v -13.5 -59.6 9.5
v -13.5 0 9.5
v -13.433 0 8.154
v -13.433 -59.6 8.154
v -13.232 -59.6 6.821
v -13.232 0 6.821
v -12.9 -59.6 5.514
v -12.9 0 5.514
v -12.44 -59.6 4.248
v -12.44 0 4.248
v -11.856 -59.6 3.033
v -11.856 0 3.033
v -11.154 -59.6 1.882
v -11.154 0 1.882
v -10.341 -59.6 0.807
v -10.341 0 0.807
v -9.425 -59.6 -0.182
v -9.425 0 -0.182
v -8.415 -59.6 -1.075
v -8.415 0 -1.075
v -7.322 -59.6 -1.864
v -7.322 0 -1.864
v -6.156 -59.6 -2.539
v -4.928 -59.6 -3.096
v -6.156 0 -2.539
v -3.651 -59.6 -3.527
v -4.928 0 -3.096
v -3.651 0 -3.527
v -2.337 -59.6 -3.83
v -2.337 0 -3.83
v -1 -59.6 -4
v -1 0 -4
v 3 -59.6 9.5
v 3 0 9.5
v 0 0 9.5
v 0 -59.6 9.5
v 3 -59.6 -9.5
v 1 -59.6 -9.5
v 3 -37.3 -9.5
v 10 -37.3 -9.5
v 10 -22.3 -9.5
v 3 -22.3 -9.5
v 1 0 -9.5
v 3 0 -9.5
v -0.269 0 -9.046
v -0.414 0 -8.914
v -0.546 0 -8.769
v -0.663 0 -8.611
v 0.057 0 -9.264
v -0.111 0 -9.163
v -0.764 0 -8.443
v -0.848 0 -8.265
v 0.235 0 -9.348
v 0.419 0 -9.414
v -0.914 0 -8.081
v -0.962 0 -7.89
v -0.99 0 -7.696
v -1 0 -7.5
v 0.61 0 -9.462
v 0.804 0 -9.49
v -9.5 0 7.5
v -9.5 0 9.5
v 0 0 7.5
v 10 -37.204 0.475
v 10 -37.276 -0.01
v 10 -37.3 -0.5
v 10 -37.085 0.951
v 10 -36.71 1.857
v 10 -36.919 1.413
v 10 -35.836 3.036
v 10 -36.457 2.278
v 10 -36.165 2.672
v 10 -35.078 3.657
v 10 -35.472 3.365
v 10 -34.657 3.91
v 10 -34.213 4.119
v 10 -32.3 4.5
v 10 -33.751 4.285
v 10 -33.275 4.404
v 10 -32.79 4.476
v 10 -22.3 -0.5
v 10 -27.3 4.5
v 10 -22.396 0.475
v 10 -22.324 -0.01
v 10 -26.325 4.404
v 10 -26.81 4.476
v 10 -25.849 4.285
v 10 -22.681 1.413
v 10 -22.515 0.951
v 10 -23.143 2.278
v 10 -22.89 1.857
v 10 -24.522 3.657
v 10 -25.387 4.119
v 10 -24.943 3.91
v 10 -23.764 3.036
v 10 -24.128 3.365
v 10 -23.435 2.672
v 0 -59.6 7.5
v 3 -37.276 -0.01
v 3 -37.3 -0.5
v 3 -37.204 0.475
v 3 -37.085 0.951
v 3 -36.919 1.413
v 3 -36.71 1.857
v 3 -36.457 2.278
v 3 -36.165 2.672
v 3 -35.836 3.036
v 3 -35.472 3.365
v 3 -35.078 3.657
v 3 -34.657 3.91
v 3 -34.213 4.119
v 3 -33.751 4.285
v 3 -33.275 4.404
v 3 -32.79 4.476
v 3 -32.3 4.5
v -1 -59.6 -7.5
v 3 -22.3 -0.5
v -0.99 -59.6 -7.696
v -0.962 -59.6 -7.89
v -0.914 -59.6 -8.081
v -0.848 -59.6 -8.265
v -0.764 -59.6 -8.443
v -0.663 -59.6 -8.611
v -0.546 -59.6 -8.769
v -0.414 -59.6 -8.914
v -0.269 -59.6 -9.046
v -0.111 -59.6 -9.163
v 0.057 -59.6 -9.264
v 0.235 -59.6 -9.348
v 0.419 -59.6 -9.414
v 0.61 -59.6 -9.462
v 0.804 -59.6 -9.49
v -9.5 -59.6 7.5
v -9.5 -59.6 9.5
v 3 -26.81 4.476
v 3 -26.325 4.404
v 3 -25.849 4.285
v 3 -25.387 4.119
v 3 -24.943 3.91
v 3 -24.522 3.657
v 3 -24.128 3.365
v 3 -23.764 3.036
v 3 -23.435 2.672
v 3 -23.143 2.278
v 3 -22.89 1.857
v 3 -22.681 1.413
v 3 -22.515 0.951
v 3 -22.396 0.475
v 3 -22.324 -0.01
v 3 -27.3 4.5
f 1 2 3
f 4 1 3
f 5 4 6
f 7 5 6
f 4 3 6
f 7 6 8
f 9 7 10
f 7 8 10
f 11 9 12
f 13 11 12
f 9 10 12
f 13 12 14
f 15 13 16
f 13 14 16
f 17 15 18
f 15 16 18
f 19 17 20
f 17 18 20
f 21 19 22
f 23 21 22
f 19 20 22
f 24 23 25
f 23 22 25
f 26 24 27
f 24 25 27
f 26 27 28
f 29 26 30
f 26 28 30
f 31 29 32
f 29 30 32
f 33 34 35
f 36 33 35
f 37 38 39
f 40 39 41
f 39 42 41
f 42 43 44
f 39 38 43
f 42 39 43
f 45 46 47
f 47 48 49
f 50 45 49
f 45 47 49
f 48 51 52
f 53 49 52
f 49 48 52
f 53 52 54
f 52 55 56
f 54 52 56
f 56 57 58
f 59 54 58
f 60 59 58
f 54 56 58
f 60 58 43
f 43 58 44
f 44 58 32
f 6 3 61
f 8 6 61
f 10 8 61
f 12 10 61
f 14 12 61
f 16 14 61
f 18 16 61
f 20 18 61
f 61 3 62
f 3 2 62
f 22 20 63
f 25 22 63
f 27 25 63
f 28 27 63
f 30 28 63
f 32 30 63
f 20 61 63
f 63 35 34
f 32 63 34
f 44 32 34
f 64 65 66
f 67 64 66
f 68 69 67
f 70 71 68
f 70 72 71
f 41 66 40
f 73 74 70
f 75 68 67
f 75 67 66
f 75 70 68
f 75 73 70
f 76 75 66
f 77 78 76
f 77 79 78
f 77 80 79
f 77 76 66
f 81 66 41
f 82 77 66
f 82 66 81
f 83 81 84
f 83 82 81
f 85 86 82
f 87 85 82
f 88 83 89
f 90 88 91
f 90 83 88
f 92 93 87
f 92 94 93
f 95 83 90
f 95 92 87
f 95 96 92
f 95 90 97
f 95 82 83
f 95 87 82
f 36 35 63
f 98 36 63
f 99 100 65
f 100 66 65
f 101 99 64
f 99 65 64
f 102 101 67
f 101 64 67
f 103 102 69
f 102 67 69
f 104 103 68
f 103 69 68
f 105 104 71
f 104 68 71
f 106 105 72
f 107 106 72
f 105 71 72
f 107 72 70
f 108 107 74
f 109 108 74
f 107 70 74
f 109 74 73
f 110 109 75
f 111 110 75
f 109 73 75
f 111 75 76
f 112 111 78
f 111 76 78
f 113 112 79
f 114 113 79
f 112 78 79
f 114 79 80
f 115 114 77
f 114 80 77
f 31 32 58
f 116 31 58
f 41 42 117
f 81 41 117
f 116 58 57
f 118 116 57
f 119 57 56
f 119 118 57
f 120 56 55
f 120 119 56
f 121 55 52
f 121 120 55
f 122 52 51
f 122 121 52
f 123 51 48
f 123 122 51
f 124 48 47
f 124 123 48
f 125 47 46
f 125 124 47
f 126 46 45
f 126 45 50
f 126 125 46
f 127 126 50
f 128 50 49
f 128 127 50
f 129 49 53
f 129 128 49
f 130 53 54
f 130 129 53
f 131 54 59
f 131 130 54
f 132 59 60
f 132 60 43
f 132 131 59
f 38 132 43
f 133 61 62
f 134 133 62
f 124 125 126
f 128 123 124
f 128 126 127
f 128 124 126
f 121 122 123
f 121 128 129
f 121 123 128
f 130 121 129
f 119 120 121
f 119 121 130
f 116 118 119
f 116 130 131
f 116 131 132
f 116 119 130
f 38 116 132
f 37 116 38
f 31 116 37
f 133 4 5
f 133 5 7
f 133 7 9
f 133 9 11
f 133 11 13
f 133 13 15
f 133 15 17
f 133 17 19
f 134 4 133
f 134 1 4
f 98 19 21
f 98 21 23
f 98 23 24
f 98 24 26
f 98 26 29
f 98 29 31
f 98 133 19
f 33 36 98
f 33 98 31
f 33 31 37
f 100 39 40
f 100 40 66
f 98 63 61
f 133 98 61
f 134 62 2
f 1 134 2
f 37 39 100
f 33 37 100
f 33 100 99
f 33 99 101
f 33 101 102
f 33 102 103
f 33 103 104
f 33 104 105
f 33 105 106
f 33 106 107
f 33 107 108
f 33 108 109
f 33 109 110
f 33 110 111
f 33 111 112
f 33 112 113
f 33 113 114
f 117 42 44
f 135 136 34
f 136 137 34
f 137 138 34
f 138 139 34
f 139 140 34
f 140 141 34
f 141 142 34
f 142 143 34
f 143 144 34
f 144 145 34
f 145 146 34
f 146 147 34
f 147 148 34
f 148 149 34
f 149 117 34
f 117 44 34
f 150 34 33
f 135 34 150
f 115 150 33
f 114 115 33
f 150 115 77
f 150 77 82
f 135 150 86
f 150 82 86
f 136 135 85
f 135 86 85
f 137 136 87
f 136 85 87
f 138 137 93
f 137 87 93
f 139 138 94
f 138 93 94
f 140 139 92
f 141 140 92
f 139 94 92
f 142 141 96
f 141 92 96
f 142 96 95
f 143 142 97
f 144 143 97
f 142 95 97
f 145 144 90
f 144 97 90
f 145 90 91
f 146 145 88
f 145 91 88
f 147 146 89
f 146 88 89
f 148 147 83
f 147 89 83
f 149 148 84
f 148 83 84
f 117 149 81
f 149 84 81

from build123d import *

# Parameters (mm, degrees)
F1_DEPTH = 59.6
F2_R     = 2
F3_W     = 15
F3_H     = 14
F4_DEPTH = 7
F5_R     = 5


with BuildPart() as f1:
    # F0 (on Front) → F1 (new body)
    with BuildSketch(Plane.XZ):
        with BuildLine():
            Line((0, -9.5), (0, 7.5))
            Line((0, 7.5), (-9.5, 7.5))
            Line((-9.5, 7.5), (-9.5, 9.5))
            Line((-9.5, 9.5), (-13.5, 9.5))
            ThreePointArc((-13.5, 9.5), (-9.89512, 0.300815), (-1, -4))
            Line((-1, -4), (-1, -9.5))
            Line((-1, -9.5), (0, -9.5))
        make_face()
        Polygon((3, 9.5), (0, 9.5), (0, 7.5), (0, -9.5), (3, -9.5), align=None)
    extrude(amount=F1_DEPTH)

    # F2
    f2_edges = [f1.edges().sort_by_distance(p)[0] for p in [
        (-1, -29.8, -9.5),
    ]]
    fillet(f2_edges, radius=F2_R)

    # F3 (on face) → F4 (join)
    with BuildSketch(Plane.YZ.offset(3)):
        with Locations((-29.8, -2.5)):
            Rectangle(F3_W, F3_H)
    extrude(amount=F4_DEPTH)

    # F5
    f5_edges = [f1.edges().sort_by_distance(p)[0] for p in [
        (6.5, -37.3, 4.5),
        (6.5, -22.3, 4.5),
    ]]
    fillet(f5_edges, radius=F5_R)


solid = f1.part
